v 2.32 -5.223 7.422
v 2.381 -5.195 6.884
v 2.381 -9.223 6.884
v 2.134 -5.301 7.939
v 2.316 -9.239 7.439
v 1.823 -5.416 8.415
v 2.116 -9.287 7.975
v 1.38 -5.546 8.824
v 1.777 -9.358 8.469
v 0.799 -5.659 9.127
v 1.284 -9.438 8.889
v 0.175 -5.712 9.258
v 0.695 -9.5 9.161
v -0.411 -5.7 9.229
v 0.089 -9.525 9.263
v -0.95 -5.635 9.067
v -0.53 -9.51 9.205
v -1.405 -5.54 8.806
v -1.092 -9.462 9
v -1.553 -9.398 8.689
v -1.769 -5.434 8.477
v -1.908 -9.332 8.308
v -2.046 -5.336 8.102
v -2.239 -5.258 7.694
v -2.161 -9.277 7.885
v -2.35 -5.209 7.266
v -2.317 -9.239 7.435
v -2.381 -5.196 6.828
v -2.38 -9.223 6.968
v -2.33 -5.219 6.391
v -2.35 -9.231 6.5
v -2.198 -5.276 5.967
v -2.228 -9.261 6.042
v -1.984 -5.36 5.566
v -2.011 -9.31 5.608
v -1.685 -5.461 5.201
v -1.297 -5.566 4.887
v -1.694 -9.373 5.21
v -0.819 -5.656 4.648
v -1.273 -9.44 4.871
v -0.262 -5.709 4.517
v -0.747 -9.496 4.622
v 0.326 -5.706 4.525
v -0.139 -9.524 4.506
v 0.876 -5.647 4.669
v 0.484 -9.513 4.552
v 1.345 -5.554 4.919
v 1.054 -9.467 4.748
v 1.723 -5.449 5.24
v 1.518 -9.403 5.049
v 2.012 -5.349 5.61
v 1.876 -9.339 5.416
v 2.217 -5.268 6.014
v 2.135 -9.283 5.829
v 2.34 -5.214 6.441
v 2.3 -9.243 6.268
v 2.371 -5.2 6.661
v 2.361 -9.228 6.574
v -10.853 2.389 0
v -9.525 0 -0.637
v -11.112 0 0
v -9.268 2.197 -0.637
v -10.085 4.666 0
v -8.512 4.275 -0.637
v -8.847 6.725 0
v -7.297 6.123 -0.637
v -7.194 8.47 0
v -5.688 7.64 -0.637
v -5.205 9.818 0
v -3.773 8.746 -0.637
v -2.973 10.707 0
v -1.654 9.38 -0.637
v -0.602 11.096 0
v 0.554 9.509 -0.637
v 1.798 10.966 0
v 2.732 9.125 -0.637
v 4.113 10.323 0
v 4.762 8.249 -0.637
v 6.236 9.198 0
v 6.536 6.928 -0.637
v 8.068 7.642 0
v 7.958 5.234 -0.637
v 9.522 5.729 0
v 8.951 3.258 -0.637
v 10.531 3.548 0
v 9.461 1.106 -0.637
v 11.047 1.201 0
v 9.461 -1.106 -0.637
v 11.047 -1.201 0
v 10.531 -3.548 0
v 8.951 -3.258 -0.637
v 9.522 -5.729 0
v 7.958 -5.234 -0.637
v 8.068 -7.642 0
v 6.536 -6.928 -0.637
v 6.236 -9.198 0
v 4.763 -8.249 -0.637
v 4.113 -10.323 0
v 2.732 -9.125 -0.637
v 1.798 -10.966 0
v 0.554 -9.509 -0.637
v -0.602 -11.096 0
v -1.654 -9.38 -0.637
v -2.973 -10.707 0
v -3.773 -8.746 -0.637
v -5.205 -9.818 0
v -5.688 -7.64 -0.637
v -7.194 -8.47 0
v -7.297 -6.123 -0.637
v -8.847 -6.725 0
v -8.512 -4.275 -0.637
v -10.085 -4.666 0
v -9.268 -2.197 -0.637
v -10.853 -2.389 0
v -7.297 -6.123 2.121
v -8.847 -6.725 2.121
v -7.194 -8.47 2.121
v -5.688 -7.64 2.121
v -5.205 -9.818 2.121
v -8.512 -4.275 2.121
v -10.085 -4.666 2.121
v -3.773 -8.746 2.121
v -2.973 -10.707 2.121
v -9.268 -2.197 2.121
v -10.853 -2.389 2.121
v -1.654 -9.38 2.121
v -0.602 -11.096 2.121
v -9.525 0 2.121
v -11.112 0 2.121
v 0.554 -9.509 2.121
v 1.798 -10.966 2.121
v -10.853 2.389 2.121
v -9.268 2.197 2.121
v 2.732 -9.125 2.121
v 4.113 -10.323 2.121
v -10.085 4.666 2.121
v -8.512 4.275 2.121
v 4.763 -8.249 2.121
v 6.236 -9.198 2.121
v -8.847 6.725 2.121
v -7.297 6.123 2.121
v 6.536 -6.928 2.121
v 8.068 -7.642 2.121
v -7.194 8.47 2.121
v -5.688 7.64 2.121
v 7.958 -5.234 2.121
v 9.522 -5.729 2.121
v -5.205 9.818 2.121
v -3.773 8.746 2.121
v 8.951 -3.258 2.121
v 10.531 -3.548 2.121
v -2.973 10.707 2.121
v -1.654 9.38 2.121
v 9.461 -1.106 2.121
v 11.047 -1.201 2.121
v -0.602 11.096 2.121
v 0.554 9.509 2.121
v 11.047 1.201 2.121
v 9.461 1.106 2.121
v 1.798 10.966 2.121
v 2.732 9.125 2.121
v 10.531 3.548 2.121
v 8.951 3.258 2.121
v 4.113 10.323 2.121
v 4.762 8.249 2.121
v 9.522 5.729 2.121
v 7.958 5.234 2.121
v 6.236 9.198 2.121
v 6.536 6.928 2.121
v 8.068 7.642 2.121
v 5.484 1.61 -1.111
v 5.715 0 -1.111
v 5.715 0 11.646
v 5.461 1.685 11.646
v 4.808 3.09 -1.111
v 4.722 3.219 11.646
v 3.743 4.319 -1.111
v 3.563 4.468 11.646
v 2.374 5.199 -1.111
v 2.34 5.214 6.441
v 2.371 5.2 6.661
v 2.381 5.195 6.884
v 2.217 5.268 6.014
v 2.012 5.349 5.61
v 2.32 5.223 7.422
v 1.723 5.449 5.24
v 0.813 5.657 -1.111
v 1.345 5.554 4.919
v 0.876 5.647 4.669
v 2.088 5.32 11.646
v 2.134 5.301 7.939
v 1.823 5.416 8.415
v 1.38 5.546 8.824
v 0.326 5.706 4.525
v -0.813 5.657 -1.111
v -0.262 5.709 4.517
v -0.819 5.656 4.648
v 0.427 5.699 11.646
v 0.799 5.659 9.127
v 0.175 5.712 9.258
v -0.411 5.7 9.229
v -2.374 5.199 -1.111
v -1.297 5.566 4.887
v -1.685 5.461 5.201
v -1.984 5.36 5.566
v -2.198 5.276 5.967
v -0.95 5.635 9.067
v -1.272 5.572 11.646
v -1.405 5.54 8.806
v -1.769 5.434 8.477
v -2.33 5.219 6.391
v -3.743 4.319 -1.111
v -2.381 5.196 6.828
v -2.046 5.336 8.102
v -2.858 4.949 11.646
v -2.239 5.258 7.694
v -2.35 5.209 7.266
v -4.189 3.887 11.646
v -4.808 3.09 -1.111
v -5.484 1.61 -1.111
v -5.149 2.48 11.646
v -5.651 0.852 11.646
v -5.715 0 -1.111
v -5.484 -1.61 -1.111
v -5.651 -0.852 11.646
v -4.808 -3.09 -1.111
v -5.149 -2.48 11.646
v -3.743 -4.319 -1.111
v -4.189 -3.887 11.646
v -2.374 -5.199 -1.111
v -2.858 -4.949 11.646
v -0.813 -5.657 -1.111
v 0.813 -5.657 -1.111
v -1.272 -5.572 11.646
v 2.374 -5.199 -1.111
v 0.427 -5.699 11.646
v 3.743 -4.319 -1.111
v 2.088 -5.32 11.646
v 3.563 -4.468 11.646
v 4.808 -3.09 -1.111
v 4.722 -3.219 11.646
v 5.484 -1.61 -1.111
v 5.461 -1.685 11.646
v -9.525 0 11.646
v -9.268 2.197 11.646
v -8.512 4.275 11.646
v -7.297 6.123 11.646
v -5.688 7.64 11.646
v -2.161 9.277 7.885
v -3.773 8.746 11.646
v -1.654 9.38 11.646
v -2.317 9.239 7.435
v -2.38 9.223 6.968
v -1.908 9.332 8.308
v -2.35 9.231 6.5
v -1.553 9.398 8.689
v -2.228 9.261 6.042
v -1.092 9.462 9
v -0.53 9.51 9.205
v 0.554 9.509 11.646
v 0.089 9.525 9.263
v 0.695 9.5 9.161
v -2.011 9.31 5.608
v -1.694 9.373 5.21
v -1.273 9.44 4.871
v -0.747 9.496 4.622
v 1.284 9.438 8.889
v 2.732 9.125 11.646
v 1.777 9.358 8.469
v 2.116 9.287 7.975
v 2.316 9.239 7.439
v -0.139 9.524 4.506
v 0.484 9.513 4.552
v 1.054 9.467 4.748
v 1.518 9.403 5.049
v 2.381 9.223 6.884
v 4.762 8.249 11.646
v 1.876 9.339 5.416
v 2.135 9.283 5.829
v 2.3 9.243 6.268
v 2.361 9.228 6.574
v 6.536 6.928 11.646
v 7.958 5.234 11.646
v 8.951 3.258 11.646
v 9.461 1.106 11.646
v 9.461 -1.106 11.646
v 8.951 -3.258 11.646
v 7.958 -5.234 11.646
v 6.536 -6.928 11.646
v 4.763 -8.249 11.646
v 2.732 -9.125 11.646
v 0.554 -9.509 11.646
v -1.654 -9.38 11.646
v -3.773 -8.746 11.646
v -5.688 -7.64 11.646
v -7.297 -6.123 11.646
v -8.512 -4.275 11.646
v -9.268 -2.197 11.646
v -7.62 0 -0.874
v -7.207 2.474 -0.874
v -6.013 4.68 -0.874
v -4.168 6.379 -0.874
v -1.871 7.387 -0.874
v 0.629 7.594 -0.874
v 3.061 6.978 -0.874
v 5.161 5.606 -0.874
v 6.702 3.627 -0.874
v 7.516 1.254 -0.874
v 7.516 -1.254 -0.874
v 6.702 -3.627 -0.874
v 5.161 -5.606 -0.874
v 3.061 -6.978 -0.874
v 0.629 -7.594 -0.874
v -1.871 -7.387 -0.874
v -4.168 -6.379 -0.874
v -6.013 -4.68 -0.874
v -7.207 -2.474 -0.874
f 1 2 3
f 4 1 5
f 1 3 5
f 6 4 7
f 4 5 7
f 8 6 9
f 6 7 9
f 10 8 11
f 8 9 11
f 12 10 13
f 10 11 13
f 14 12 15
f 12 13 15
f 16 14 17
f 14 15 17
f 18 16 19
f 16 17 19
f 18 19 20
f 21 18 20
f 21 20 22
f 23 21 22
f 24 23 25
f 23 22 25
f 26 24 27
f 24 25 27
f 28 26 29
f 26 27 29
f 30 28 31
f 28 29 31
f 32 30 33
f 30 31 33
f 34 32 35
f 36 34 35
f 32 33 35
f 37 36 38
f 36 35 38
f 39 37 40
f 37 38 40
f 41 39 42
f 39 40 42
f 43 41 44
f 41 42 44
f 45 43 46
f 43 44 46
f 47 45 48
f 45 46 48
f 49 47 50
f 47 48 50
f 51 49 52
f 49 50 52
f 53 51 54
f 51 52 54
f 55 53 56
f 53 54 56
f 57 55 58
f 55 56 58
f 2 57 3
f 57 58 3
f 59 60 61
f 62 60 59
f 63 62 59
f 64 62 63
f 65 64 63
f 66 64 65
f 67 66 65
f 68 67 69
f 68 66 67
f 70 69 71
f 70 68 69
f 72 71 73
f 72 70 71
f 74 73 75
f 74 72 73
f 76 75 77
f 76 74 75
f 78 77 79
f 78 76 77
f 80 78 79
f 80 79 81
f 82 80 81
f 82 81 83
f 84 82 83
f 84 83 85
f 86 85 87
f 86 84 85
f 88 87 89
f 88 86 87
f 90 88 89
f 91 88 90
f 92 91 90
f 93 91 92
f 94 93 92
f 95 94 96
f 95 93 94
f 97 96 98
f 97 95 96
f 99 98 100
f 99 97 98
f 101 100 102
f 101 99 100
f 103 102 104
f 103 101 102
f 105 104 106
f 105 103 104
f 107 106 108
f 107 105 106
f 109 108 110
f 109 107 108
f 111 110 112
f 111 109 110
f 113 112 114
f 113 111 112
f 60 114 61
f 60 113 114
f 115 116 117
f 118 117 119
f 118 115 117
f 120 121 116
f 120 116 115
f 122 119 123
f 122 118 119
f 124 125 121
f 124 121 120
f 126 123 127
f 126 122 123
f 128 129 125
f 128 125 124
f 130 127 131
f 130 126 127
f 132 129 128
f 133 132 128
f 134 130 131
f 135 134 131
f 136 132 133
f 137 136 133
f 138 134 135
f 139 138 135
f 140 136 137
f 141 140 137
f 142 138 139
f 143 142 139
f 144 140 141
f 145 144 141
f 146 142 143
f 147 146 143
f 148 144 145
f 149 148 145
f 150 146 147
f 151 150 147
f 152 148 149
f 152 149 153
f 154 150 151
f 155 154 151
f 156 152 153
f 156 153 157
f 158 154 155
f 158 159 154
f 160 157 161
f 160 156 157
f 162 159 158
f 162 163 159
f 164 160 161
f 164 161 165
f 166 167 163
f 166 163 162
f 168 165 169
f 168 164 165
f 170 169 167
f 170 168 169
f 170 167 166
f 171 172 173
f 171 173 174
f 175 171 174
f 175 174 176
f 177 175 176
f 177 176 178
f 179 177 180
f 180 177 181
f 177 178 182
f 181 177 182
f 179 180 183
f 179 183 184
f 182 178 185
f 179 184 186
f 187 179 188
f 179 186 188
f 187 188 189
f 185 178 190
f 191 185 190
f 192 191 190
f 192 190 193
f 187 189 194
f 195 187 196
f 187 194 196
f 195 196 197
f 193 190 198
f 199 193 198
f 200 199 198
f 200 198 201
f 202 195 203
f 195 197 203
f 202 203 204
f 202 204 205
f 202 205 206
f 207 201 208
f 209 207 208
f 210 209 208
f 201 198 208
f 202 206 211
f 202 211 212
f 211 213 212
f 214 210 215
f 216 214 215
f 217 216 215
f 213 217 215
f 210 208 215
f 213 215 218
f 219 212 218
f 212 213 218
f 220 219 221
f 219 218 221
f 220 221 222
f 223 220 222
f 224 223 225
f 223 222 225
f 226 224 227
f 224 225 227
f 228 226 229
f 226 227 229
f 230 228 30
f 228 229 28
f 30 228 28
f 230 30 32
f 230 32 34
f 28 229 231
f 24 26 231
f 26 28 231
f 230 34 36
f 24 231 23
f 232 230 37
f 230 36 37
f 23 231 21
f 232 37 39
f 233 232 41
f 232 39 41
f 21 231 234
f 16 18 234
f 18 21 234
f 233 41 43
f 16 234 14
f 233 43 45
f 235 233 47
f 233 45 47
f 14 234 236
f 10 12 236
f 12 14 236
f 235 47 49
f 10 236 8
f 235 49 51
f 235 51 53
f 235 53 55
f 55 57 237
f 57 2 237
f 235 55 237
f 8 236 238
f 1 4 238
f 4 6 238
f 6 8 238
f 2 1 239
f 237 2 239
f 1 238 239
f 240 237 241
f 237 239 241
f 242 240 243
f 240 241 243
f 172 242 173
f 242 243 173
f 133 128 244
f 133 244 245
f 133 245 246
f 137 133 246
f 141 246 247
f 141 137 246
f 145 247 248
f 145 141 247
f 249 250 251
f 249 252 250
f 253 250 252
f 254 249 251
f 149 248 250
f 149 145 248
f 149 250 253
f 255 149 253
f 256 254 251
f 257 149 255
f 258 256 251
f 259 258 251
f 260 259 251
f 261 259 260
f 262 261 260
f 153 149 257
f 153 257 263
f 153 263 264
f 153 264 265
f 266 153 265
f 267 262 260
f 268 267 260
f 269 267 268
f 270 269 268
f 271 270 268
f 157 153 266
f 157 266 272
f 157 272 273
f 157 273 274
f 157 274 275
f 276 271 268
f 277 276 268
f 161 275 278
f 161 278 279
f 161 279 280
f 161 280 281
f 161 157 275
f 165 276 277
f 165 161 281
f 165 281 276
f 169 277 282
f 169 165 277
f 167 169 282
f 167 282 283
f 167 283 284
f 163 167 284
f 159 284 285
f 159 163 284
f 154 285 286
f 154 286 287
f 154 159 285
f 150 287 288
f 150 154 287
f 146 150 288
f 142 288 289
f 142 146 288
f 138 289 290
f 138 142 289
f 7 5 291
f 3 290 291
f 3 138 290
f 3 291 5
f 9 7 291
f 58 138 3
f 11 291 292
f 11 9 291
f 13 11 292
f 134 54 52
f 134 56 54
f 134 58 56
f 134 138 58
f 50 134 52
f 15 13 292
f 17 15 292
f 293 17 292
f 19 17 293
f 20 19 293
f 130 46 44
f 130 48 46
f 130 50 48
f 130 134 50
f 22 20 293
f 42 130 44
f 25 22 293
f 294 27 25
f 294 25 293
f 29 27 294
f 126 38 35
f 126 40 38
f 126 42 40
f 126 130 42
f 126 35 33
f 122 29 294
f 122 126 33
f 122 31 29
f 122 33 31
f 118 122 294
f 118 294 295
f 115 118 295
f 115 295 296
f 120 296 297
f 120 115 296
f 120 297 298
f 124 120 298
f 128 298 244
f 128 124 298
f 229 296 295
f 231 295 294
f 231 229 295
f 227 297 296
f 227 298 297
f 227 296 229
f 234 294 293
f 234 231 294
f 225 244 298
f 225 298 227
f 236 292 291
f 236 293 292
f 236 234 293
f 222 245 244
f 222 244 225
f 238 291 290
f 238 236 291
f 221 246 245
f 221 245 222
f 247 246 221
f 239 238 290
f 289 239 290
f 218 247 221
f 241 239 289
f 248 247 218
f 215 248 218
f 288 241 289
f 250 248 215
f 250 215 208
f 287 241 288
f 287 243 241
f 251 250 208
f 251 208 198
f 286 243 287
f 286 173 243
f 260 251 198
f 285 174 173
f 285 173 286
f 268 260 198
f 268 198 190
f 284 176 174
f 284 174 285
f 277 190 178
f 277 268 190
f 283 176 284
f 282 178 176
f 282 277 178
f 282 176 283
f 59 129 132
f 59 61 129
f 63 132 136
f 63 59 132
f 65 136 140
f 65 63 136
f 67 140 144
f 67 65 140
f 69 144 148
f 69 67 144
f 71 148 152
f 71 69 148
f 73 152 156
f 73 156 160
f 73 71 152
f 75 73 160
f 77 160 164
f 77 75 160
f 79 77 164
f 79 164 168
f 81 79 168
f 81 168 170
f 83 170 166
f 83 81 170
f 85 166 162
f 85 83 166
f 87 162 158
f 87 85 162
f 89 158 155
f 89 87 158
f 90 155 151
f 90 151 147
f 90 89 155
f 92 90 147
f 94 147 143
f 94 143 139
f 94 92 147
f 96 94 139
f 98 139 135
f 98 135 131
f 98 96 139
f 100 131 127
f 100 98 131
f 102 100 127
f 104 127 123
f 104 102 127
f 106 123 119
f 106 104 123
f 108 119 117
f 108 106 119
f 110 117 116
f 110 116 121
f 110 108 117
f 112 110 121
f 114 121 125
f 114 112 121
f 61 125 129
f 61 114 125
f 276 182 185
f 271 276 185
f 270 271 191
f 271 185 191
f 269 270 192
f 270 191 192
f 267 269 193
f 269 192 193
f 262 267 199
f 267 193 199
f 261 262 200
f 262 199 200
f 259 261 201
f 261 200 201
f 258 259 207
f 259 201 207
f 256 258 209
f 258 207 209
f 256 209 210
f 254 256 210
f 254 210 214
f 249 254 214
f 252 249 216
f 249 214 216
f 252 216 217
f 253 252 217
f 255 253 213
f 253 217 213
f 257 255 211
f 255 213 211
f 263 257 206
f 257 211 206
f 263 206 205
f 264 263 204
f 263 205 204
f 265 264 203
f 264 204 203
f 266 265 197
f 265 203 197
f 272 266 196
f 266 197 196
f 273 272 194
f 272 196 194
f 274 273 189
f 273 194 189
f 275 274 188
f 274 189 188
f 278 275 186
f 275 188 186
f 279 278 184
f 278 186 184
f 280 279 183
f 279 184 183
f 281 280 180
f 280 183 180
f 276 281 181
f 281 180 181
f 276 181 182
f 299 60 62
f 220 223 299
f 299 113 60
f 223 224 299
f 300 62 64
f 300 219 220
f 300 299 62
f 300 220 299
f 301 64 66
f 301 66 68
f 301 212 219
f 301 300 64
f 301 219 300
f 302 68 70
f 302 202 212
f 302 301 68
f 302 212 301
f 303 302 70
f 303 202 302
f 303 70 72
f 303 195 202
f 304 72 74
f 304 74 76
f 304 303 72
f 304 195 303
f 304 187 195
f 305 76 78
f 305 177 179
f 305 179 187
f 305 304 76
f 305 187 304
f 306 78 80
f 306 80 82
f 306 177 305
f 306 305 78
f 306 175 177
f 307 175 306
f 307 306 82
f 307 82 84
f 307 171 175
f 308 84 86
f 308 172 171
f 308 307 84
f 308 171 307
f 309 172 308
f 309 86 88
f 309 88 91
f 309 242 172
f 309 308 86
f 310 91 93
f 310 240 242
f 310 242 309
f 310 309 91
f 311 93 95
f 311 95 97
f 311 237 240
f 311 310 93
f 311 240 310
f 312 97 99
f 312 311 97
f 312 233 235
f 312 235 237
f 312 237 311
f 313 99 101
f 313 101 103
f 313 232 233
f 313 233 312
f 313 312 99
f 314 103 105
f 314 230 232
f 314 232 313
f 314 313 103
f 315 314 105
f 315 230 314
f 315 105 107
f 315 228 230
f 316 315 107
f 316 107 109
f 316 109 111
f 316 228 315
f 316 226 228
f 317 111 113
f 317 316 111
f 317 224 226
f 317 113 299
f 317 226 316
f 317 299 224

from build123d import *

# Parameters (mm, degrees)
F2_R     = 2.38125
F3_DEPTH = 12.7
F4_R     = 5.715
F5_DEPTH = 12.7


with BuildPart() as f1:
    # F0 (on Front) → F1 (revolve)
    with BuildSketch(Plane.XZ):
        Polygon((0, -1.2290018785), (0, 11.6460951906), (-9.525, 11.6460951906), (-9.525, 2.1210951906), (-11.1125, 2.1210951906), (-11.1125, 0), (-9.525, -0.637396297), (-4.7625, -1.2290018785), align=None)
    revolve(axis=Axis((0, 0, 5.2085466561), (0, 0, -1)))

    # F2 (on Front) → F3 (cut, symmetric)
    with BuildSketch(Plane.XZ):
        with Locations((0, 6.8835951906)):
            Circle(F2_R)
    extrude(amount=F3_DEPTH, both=True, mode=Mode.SUBTRACT)

    # F4 (on Top) → F5 (cut, symmetric)
    with BuildSketch(Plane.XY):
        Circle(F4_R)
    extrude(amount=F5_DEPTH, both=True, mode=Mode.SUBTRACT)


solid = f1.part
